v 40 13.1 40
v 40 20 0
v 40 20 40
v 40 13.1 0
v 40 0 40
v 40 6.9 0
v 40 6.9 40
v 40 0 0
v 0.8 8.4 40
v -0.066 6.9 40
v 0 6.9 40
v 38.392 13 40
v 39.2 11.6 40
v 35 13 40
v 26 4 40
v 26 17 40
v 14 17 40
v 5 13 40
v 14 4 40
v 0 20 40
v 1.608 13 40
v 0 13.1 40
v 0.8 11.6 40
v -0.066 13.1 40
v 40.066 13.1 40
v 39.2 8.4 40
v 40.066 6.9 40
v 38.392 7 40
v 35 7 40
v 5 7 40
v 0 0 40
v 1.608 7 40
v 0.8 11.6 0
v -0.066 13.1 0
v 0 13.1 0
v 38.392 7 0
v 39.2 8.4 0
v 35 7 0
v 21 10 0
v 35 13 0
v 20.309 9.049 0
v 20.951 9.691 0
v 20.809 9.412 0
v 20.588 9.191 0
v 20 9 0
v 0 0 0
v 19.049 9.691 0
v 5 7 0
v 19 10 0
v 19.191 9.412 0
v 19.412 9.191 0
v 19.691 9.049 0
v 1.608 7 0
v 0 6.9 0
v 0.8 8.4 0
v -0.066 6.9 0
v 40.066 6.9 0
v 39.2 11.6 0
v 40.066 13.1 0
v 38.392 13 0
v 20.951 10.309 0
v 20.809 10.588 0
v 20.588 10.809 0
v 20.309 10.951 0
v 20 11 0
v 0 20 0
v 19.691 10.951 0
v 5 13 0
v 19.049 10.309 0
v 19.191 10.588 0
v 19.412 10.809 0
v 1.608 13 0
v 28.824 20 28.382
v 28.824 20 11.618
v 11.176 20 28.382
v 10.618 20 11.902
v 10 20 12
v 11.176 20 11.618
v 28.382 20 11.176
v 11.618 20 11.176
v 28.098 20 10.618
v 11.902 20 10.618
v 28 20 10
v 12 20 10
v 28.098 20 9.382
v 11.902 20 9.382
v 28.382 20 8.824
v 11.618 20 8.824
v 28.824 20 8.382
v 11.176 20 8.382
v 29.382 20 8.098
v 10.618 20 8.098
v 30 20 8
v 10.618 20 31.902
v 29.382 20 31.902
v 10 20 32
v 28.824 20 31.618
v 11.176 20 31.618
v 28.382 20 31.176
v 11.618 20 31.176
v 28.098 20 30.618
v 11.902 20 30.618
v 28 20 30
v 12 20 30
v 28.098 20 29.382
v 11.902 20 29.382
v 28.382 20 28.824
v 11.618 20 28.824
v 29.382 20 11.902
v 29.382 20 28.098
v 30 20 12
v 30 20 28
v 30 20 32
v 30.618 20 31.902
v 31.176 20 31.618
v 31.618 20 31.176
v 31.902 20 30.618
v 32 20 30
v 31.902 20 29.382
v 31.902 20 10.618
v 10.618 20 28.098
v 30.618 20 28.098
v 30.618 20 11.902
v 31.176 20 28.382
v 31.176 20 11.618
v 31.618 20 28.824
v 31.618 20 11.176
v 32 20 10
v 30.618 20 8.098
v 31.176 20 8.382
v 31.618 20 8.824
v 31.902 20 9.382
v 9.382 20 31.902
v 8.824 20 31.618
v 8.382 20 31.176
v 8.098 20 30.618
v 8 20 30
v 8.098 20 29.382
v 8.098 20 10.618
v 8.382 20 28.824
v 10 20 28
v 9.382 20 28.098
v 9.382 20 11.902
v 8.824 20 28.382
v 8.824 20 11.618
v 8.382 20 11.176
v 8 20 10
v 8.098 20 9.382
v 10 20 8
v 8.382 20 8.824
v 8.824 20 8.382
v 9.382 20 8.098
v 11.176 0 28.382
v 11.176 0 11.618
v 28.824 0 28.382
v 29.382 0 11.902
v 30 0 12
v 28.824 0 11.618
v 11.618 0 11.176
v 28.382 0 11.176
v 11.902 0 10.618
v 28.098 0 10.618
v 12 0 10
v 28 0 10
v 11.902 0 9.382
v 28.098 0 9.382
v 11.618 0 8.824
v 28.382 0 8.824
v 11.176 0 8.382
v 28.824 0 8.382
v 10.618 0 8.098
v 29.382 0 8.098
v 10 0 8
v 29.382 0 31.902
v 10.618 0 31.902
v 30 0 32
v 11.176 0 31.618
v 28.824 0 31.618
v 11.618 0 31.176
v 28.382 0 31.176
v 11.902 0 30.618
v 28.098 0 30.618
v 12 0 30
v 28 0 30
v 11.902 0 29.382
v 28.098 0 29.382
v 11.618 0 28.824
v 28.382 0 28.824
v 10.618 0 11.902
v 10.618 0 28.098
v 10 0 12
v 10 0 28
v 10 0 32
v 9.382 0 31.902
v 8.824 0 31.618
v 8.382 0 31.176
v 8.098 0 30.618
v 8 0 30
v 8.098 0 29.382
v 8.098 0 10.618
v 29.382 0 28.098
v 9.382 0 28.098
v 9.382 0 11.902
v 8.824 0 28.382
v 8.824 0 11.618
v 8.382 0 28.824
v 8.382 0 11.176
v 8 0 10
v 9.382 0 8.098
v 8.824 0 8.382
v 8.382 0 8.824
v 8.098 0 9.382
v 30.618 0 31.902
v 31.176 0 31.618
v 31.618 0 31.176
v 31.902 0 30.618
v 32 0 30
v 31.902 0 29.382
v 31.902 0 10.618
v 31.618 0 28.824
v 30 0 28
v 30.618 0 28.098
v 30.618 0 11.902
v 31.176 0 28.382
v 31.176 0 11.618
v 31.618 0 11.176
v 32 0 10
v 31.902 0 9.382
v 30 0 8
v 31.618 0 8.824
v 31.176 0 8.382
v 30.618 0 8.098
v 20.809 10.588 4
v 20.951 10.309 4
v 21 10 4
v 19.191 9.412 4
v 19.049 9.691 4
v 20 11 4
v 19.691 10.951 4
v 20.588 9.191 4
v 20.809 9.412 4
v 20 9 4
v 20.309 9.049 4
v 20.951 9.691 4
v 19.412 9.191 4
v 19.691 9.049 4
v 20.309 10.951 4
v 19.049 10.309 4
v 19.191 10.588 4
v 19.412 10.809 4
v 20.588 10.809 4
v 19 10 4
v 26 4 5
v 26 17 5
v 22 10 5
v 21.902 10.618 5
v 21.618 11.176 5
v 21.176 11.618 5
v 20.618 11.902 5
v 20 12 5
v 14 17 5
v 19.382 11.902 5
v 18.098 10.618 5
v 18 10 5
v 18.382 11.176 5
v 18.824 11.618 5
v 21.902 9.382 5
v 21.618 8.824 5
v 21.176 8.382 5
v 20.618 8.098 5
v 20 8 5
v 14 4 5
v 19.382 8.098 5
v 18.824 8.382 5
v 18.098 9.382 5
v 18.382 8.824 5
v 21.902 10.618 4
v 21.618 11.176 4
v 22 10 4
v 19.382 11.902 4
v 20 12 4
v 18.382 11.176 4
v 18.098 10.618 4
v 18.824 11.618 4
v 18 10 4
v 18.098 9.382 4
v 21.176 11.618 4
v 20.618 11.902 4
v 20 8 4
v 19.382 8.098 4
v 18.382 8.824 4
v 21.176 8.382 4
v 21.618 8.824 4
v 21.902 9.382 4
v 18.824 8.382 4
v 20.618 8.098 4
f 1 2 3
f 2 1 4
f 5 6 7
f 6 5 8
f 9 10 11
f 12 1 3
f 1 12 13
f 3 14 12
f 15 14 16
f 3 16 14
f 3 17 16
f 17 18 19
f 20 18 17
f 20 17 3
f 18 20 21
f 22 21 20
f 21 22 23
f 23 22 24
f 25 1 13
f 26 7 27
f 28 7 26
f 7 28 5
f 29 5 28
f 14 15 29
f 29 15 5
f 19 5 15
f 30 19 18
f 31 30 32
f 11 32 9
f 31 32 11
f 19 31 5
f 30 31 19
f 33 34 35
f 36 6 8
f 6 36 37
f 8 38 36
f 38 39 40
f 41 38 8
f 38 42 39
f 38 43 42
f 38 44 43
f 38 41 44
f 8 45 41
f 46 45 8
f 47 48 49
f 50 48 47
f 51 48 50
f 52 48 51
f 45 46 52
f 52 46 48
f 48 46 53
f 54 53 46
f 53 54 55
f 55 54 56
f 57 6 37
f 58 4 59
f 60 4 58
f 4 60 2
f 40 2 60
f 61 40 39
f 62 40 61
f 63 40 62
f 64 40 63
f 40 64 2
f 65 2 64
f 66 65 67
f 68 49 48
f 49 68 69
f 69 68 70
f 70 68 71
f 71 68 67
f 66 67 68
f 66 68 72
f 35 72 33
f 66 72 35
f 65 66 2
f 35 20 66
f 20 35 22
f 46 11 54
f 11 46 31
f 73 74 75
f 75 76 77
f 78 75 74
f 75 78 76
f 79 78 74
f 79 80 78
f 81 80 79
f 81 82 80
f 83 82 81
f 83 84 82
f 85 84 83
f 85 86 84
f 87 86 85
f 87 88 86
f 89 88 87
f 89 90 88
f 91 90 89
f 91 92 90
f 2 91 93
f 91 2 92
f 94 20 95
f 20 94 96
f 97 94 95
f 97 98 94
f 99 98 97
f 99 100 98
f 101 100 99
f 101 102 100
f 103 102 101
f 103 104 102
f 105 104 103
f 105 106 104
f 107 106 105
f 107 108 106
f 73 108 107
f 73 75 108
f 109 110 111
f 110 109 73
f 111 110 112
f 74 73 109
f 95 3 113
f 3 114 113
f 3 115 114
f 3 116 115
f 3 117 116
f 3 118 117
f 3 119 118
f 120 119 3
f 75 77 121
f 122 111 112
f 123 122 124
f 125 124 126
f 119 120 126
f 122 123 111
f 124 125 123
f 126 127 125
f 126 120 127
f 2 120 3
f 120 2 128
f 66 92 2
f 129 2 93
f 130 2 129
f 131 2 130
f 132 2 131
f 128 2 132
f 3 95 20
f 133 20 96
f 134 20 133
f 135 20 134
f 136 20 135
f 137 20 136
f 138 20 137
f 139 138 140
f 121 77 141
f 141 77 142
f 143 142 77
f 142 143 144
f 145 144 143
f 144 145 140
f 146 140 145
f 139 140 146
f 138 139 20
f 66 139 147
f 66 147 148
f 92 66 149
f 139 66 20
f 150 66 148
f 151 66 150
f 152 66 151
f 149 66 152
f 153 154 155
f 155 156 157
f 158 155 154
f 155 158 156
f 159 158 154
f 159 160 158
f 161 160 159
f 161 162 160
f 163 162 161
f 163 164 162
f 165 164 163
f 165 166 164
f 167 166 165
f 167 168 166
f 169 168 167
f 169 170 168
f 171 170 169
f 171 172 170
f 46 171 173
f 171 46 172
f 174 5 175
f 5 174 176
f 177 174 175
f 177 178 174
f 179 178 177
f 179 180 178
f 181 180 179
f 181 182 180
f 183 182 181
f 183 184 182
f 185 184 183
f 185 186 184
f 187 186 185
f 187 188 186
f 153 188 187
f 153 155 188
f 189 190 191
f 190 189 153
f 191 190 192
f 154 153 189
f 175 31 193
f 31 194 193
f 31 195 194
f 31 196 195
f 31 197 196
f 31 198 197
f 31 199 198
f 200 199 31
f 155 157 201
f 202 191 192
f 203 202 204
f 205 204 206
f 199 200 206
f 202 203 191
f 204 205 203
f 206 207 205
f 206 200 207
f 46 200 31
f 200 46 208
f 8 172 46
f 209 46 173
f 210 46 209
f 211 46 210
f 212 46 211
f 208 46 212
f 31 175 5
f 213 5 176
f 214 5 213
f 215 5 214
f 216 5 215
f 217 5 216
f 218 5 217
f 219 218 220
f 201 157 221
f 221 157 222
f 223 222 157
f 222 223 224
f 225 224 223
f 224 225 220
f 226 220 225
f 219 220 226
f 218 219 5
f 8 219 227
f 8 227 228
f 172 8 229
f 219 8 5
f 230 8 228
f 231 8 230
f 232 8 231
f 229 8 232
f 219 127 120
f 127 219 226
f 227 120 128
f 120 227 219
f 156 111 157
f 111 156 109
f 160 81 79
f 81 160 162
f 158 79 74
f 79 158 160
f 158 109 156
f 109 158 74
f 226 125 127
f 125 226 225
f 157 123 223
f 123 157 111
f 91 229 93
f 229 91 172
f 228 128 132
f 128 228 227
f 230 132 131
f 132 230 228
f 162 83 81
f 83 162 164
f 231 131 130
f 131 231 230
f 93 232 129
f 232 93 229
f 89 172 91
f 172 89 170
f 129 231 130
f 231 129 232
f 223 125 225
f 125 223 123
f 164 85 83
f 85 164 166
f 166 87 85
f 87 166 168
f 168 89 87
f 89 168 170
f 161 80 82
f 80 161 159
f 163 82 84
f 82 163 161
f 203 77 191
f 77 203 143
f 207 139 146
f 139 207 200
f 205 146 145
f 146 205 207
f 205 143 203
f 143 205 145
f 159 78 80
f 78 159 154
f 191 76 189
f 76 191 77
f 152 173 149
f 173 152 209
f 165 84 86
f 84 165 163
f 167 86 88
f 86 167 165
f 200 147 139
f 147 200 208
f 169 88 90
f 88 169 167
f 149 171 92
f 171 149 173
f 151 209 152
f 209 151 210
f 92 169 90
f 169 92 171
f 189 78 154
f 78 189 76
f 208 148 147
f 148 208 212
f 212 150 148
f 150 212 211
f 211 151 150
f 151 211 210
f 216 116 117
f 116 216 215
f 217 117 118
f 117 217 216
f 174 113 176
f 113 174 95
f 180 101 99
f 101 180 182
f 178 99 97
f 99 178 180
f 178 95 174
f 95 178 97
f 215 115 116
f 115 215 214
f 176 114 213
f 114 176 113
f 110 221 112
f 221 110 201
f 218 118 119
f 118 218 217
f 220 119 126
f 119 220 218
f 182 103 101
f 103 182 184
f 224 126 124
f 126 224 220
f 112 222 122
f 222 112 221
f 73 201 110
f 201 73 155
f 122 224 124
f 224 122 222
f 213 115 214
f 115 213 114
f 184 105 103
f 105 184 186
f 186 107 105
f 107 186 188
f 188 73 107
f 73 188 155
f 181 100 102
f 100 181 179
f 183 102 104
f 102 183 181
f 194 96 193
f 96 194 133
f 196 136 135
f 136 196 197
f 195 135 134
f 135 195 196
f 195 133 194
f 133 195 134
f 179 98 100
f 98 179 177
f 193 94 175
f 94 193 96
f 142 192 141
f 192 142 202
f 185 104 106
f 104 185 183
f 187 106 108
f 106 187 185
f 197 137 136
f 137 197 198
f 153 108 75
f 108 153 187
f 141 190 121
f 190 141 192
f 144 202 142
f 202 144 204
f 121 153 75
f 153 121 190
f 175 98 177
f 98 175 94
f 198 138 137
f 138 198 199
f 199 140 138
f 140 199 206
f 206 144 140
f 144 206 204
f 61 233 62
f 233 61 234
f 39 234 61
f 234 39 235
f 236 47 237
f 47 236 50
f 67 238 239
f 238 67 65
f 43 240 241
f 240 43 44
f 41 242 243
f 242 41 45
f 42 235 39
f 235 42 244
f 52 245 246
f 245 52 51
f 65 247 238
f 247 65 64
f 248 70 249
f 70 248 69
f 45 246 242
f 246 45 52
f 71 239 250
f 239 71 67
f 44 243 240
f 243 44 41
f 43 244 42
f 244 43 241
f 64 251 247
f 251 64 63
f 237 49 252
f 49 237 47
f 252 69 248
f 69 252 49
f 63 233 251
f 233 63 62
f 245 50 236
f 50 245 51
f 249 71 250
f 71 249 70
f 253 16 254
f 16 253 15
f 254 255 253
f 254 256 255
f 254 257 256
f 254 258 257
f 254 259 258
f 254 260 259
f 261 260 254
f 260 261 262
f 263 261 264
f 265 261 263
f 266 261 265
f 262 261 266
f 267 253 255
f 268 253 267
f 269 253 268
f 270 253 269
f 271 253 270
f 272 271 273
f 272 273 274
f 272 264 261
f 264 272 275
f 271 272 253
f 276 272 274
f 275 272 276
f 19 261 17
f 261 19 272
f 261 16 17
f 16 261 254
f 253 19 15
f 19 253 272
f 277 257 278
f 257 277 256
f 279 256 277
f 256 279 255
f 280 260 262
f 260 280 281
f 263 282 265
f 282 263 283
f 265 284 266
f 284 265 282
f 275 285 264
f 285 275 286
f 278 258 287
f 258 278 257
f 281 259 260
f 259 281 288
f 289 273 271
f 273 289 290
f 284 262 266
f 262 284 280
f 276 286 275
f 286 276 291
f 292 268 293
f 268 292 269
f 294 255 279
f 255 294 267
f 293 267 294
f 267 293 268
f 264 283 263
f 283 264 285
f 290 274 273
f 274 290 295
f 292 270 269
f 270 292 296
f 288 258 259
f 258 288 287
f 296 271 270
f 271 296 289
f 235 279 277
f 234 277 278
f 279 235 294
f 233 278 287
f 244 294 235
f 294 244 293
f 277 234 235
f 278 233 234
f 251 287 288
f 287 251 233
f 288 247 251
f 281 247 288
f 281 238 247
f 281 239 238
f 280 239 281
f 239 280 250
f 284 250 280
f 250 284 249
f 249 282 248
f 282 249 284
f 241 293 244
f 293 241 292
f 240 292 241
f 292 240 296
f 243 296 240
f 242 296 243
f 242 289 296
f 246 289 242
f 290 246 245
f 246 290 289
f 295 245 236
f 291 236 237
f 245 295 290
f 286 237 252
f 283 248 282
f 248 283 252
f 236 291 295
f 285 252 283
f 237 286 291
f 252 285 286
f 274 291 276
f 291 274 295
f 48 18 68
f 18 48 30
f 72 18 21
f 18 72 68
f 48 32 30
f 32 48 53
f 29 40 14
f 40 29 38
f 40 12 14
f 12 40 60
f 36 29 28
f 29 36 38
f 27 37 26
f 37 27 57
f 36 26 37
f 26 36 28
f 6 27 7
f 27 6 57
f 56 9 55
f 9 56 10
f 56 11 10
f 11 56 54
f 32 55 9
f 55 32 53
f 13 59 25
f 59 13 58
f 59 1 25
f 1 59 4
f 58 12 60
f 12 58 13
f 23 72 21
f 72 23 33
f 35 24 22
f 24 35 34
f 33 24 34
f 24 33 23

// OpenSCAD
module cuerpo(alto,ancho,largo, anchoagujero, radioagujero){
    difference(){
        cube([alto,ancho,largo]);
        
        //Agujeros
        rotate([90, 0, 0])
            translate([30,10,-20])
                        cylinder(h = anchoagujero, r = radioagujero, $fn=20);
        rotate([90, 0, 0])
            translate([10,10,-20])
                        cylinder(h = anchoagujero, r = radioagujero, $fn=20);
        rotate([90, 0, 0])
            translate([30,30,-20])
                        cylinder(h = anchoagujero, r = radioagujero, $fn=20);
        rotate([90, 0, 0])
            translate([10,30,-20])
                        cylinder(h = anchoagujero, r = radioagujero, $fn=20);
        //Agujero de debajo
        translate([20,10,0])
                        cylinder(h = anchoagujero, r = 1, $fn=20);
        //Cubo agujero
        translate([14,4,5]){
            cube([alto/2 -8,ancho-7,largo]);
        }
        //Pequeño reborde interior cilindrico
        translate([20,10,4])
               cylinder(h = anchoagujero, r = radioagujero, $fn=20);
        //Bifurcaciones rectangulares de los laterales
        translate([0,7,0]){
            cube([5,6,largo]);
        }
        translate([35,7,0]){
            cube([5,6,largo]);
        }
    }
    //Bifurcaciones triangulares exteriores
        rotate([0,0,90])
            translate([7.4,-39.2,0])
                cylinder (h = 40, r= 1, $fn=3);
        rotate([0,0,90])
            translate([7.4,-0.8,0])
                cylinder (h = 40, r= 1, $fn=3);
        rotate([0,0,-90])
            translate([-12.6,39.2,0])
                cylinder (h = 40, r= 1, $fn=3);
        rotate([0,0,-90])
            translate([-12.6,0.8,0])
                cylinder (h = 40, r= 1, $fn=3);
        
}

cuerpo(40,20,40, 40,2);
